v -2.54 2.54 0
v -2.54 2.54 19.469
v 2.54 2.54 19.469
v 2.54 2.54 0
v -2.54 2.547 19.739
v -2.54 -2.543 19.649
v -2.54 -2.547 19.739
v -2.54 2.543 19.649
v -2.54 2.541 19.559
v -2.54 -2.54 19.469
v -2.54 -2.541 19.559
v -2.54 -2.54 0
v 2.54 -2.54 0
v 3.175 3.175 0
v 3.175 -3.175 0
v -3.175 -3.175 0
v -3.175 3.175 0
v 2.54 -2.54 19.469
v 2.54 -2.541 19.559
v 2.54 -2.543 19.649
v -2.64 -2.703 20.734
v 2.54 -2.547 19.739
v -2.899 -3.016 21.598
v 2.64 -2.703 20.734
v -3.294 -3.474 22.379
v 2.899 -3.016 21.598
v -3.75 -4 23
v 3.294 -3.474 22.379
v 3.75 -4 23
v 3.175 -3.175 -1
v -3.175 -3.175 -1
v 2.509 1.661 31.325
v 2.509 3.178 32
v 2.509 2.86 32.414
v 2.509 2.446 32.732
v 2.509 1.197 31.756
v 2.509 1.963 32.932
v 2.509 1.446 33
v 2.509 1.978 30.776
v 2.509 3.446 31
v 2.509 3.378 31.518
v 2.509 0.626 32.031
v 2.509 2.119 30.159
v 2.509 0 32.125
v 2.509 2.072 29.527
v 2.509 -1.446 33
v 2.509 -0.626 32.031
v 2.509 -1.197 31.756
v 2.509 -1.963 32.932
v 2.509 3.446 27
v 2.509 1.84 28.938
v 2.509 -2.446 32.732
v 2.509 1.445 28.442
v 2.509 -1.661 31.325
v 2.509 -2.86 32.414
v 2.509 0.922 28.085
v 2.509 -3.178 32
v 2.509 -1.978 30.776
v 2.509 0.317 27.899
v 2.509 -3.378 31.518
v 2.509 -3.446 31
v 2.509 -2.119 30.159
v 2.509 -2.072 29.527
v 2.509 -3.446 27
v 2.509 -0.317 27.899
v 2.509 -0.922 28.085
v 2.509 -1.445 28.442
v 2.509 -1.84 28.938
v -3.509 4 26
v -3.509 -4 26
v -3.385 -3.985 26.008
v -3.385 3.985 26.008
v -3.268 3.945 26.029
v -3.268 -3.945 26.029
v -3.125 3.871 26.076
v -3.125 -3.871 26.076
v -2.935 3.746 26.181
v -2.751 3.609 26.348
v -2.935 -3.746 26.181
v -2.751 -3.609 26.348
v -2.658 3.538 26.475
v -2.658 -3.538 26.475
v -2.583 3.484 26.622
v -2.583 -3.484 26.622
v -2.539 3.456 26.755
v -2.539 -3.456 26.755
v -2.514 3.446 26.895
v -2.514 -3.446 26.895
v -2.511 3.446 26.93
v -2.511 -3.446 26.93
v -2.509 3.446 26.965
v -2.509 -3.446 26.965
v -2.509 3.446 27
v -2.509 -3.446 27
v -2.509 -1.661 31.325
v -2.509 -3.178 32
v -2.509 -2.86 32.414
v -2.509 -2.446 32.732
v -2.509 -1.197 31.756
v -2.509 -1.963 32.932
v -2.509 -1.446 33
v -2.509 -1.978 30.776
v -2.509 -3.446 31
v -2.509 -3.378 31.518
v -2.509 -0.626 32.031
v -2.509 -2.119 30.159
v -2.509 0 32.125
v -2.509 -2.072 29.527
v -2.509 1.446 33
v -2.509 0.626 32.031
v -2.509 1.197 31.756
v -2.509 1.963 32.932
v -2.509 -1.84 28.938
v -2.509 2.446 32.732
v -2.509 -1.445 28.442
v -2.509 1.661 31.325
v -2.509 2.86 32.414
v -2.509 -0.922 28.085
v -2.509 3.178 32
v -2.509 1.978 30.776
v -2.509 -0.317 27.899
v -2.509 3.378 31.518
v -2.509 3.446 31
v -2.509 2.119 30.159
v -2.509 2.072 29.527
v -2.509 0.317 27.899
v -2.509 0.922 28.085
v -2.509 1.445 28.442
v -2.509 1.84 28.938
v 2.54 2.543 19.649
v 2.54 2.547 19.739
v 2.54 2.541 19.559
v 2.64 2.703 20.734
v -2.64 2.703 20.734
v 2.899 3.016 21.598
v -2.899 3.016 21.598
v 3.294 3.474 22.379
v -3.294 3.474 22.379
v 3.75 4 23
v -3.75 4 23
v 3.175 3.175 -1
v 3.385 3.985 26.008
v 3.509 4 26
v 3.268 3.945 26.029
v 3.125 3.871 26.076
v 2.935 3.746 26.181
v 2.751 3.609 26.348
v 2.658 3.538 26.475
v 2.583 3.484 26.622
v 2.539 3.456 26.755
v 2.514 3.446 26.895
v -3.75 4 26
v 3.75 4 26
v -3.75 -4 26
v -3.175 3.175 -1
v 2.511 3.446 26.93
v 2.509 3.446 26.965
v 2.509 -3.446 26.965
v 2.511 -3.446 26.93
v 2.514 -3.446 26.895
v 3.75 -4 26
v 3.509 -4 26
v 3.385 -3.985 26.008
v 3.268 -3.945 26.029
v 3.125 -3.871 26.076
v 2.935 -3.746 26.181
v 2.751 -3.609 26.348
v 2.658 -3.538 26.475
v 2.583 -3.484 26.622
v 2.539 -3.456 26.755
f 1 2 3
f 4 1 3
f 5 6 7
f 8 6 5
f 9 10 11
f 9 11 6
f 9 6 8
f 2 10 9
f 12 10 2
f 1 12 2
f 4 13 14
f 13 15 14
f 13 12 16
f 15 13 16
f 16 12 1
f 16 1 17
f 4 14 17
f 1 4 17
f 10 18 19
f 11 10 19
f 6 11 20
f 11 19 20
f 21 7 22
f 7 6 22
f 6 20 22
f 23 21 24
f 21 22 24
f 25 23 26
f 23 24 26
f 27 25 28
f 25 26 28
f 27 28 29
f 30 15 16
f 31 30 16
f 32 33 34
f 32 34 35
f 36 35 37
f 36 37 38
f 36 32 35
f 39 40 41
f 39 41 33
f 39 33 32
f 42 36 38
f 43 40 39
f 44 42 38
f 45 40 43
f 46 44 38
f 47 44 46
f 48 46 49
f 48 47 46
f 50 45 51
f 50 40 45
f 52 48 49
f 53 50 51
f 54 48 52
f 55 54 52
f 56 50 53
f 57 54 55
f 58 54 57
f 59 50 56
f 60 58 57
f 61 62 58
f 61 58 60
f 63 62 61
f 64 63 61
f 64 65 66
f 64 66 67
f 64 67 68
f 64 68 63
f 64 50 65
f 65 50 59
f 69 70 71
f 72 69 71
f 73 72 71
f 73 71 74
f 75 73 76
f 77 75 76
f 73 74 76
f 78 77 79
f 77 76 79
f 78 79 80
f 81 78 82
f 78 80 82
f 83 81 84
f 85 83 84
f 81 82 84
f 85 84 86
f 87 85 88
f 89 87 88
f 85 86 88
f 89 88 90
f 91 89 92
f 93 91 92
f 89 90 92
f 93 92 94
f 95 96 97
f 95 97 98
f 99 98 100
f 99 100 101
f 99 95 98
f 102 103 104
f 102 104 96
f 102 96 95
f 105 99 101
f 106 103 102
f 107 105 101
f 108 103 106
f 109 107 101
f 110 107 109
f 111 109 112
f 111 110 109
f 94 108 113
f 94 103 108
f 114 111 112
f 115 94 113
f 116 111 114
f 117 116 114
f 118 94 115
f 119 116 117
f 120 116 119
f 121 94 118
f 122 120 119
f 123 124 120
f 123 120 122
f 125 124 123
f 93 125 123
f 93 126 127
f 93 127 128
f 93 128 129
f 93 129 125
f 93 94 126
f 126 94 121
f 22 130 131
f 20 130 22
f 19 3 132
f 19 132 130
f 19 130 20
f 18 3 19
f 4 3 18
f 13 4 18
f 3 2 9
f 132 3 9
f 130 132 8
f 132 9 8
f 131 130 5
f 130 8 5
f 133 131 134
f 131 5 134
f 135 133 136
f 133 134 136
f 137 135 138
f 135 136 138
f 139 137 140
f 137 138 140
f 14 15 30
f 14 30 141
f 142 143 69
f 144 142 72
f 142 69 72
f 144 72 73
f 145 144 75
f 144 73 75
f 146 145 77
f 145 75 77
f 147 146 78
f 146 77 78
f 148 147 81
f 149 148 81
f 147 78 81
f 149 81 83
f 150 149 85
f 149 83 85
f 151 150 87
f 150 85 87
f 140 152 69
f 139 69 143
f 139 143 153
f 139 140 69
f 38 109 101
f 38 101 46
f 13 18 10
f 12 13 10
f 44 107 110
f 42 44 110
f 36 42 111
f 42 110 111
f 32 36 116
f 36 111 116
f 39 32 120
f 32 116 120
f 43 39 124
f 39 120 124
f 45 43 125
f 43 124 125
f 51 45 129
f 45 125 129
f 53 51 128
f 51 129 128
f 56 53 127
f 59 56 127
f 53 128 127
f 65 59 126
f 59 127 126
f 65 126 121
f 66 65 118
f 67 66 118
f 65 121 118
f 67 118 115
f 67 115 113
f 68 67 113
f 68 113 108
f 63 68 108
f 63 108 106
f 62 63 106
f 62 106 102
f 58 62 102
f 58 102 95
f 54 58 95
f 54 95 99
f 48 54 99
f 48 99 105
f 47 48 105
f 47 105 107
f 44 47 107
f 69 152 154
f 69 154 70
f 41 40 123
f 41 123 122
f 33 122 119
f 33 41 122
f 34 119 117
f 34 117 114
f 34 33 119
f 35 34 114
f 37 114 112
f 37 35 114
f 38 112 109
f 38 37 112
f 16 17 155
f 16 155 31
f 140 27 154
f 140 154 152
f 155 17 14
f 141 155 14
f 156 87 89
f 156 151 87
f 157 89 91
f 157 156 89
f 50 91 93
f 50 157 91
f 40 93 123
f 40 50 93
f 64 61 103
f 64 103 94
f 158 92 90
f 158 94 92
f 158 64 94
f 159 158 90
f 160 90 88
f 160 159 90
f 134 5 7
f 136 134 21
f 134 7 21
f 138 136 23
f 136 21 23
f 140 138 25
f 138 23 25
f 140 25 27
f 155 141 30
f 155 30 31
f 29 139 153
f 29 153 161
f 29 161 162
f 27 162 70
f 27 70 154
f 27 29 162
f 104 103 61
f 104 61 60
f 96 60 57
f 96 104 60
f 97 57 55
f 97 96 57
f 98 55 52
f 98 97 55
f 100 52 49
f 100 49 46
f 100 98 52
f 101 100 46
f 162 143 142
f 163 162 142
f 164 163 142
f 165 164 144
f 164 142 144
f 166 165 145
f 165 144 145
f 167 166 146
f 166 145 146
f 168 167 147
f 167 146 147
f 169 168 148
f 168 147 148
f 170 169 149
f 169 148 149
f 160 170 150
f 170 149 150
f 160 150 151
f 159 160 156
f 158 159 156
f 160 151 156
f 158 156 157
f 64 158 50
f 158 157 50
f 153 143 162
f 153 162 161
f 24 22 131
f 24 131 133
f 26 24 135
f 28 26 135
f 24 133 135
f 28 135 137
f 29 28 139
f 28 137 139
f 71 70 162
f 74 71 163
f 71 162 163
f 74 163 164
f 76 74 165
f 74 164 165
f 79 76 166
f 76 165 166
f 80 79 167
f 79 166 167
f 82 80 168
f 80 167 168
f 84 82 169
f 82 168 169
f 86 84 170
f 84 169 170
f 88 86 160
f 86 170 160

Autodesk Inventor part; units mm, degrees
ref_plane "YZ Plane" through (0, 0, 0) normal (1, 0, 0) x (0, 1, 0)
ref_plane "XZ Plane" through (0, 0, 0) normal (0, 1, 0) x (-1, 0, 0)
ref_plane "XY Plane" through (0, 0, 0) normal (0, 0, 1) x (1, 0, 0)
sketch "Sketch1" plane through (0, 0, 0) normal (0, 0, 1) x (1, 0, 0)
  line L0 (-3.175, -3.175) -> (-3.175, 3.175) projected
  line L1 (-3.175, 3.175) -> (3.175, 3.175) projected
  line L2 (3.175, 3.175) -> (3.175, -3.175) projected
  line L3 (3.175, -3.175) -> (-3.175, -3.175) projected
  line L4 (-5, -5) -> (5, -5) projected
  line L5 (5, -5) -> (5, 5) projected
  line L6 (5, 5) -> (-5, 5) projected
  line L7 (-5, 5) -> (-5, -5) projected
  line L8 (-4.1303, 4.1303) -> (4.1303, 4.1303) projected
  line L9 (4.1303, 4.1303) -> (4.1303, -4.1303) projected
  line L10 (-4.1303, -4.1303) -> (-4.1303, 4.1303) projected
  line L11 (4.1303, -4.1303) -> (-4.1303, -4.1303) projected
  line L12 (2.54, -2.54) -> (-2.54, -2.54)
  line L13 (-2.54, -2.54) -> (-2.54, 2.54)
  line L14 (-2.54, 2.54) -> (2.54, 2.54)
  line L15 (2.54, 2.54) -> (2.54, -2.54)
  line L16 (2.54, -2.54) -> (-2.54, 2.54) construction
  line L17 (-2.54, -2.54) -> (2.54, 2.54) construction
  point P0 (0, 0)
  dimension "d0" = 5.08
  dimension "d1" = 5.08
extrude "Extrusion1" add sketch "Sketch1" along normal blind 25 contours L12 L13 L14 L15
sketch "Sketch2" plane through (0, 0, 0) normal (0, 0, -1) x (-1, 0, 0)
  line L0 (-3.175, -3.175) -> (-3.175, 3.175) projected
  line L1 (3.175, 3.175) -> (3.175, -3.175) projected
  line L2 (-3.175, -3.175) -> (3.175, -3.175)
  line L3 (3.175, -3.175) -> (3.175, 3.175)
  line L4 (3.175, 3.175) -> (-3.175, 3.175)
  line L5 (-3.175, 3.175) -> (-3.175, -3.175)
  point P0 (0, 0)
extrude "Extrusion2" add sketch "Sketch2" along normal blind 1
sketch "Sketch3" plane through (0, 0, 25) normal (0, 0, 1) x (1, 0, 0)
  line L0 (3.75, -4) -> (-3.75, -4)
  line L1 (-3.75, -4) -> (-3.75, 4)
  line L2 (-3.75, 4) -> (3.75, 4)
  line L3 (3.75, 4) -> (3.75, -4)
  line L4 (3.75, -4) -> (-3.75, 4) construction
  line L5 (-3.75, -4) -> (3.75, 4) construction
  point P0 (0, 0)
  dimension "d6" = 7.5
  dimension "d7" = 8
extrude "Extrusion3" add sketch "Sketch3" along normal blind 1 and the other way blind 2
fillet "Fillet1" radius 5 4 edges at (0, 2.54, 23) (2.54, 0, 23) (-2.54, 0, 23) (0, -2.54, 23)
sketch "Sketch4" plane through (0, 0, 26) normal (0, 0, 1) x (1, 0, 0)
  line L0 (2.5088, -3.4457) -> (-2.5088, -3.4457)
  line L1 (-2.5088, -3.4457) -> (-2.5088, 3.4457)
  line L2 (-2.5088, 3.4457) -> (2.5088, 3.4457)
  line L3 (2.5088, 3.4457) -> (2.5088, -3.4457)
  line L4 (2.5088, -3.4457) -> (-2.5088, 3.4457) construction
  line L5 (-2.5088, -3.4457) -> (2.5088, 3.4457) construction
  point P0 (0, 0)
extrude "Extrusion4" add sketch "Sketch4" along normal blind 7
sketch "Sketch5" plane through (-2.5088, -3.4457, 26) normal (-1, 0, 0) x (0, 0, 1)
  line L0 (0, 6.8913) -> (7, 6.8913) projected
  line L1 (0, 0) -> (4, 0)
  line L2 (4, 0) -> (4, 6.8913)
  line L3 (4, 6.8913) -> (0, 6.8913)
  line L4 (0, 6.8913) -> (0, 0)
  circle A0 centre (4, 3.4457) radius 2.125
  point P0 (-26, 3.4457)
  dimension "d15" = 4
  dimension "d16" = 4.25
extrude "Extrusion5" cut sketch "Sketch5" against normal blind 7 contours A0 L2 | L2 A0
fillet "Fillet2" radius 1 4 edges at (-2.5088, 0, 26) (0, -3.4457, 26) (2.5088, 0, 26) (0, 3.4457, 26)
fillet "Fillet3" radius 2 2 edges at (0, -3.4457, 33) (0, 3.4457, 33)
properties part number "arm-seg2"
